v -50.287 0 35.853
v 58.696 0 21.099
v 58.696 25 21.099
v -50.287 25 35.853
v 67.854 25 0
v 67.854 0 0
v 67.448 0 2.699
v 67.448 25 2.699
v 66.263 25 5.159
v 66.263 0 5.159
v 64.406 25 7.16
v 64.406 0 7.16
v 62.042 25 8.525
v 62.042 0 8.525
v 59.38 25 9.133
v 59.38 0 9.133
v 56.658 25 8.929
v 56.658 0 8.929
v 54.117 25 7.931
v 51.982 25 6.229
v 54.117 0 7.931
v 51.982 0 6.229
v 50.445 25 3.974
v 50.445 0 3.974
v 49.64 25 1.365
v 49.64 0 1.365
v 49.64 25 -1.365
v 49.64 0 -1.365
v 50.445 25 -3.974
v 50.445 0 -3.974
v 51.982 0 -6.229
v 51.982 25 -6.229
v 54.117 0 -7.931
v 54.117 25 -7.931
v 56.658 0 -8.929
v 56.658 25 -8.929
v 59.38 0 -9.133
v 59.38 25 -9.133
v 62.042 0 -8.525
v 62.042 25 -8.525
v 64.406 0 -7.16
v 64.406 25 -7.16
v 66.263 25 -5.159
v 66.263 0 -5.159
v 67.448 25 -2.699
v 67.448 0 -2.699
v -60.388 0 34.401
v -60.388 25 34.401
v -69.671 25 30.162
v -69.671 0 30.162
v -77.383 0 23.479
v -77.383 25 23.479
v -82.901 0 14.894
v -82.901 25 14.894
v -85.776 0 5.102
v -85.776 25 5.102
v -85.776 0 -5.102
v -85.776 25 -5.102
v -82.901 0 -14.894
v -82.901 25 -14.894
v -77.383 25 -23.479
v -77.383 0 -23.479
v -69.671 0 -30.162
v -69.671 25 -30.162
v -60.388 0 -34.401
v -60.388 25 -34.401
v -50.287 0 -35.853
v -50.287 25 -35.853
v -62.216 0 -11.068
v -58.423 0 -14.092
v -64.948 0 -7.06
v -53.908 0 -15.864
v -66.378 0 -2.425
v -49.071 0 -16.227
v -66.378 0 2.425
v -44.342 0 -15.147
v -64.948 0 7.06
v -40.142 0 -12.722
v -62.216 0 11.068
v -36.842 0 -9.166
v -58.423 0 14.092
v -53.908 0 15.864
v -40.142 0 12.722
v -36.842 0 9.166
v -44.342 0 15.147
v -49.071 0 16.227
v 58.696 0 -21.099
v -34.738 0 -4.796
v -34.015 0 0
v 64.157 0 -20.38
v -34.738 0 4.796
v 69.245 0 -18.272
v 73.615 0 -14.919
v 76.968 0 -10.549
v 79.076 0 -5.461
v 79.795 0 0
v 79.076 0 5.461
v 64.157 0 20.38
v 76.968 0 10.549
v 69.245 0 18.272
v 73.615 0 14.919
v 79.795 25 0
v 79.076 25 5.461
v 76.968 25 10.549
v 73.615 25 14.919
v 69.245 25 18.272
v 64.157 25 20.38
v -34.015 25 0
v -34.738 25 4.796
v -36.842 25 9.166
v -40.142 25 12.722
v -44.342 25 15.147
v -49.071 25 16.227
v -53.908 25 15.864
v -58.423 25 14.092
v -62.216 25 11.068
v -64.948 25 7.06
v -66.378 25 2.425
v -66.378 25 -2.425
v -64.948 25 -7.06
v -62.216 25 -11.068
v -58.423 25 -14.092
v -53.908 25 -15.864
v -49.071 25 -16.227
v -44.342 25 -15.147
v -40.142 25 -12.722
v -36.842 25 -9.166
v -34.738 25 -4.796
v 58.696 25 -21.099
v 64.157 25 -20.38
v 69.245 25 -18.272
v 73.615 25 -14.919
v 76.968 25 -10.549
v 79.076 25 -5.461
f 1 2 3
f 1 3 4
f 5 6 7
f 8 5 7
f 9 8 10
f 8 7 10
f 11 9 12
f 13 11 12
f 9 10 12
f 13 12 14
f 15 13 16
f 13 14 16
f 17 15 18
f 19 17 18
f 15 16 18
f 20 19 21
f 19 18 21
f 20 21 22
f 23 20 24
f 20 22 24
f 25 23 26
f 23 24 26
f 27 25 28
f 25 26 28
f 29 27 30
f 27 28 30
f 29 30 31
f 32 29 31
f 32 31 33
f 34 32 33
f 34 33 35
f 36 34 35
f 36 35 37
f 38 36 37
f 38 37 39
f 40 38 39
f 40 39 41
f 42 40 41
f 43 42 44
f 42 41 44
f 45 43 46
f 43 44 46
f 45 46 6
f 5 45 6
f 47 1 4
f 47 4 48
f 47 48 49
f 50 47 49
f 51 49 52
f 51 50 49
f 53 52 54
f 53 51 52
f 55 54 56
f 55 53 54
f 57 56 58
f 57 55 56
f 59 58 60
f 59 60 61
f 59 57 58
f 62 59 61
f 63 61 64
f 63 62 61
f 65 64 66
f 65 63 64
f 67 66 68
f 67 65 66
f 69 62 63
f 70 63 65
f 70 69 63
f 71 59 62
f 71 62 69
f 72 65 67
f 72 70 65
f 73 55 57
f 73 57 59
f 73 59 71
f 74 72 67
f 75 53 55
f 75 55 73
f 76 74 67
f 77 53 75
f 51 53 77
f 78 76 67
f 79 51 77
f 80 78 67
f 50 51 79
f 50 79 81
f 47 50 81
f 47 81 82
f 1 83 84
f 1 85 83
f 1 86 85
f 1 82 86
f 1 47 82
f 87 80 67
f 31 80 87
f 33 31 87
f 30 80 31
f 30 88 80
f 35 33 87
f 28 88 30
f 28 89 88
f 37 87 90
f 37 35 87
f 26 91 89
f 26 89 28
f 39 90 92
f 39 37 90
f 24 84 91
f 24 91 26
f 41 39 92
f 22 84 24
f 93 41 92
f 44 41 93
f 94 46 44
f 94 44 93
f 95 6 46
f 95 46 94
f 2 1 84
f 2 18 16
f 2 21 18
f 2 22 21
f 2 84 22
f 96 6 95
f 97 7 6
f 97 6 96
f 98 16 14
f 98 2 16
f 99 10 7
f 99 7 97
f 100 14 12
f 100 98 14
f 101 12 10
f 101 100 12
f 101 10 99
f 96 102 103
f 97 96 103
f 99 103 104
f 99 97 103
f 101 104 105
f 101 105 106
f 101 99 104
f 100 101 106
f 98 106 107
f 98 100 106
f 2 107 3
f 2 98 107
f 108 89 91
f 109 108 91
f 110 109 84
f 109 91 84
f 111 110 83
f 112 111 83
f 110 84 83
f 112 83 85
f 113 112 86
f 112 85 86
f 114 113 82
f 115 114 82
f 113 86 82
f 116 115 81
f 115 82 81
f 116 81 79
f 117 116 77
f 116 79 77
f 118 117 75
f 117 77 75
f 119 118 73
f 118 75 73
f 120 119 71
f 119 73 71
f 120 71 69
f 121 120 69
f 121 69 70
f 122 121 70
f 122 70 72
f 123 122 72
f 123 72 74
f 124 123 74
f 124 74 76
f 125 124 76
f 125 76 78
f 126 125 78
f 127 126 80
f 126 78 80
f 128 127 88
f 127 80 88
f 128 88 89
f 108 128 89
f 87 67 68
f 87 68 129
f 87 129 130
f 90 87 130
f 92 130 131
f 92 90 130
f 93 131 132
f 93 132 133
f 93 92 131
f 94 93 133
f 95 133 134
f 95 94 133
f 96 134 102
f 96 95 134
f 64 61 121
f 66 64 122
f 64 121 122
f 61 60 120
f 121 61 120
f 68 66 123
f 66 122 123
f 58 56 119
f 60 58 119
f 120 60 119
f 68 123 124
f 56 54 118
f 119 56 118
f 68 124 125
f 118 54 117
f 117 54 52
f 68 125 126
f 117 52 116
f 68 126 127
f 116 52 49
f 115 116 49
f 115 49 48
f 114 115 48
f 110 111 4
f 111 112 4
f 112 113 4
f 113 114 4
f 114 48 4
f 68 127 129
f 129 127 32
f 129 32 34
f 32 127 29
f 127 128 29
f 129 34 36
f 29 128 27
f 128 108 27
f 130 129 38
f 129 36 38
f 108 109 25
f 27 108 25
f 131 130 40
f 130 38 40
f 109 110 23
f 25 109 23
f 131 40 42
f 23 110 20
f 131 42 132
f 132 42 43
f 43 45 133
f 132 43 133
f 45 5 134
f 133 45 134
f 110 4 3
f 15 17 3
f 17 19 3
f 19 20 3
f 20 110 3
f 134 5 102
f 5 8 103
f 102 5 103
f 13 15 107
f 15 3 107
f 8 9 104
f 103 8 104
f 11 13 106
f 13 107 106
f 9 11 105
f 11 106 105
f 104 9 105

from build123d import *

# Parameters (mm, degrees)
F0_R     = 16.2722693288
F0_R_2   = 9.1584338909
F1_DEPTH = 25


# Not quite as in the source:
# - the program builds the solid bodies; features that only make, move or delete a surface that nothing else refers to are left out


with BuildPart() as f1:
    # F0 (on Front) → F1 (new body)
    with BuildSketch(Plane.XZ):
        with BuildLine():
            Line((-40.7540334754, 34.5627303773), (-50.2872206271, 35.8533678809))
            ThreePointArc((-50.2872206271, 35.8533678809), (-86.140588508, 0), (-50.2872206271, -35.8533678809))
            Line((-50.2872206271, -35.8533678809), (-40.7540334754, -34.5627303773))
            ThreePointArc((-40.7540334754, -34.5627303773), (-21.7630128867, -21.721730161), (-14.4338527462, 0))
            ThreePointArc((-14.4338527462, 0), (-21.7630128867, 21.721730161), (-40.7540334754, 34.5627303773))
        make_face()
        with Locations((-50.2872206271, 0)):
            Circle(F0_R, mode=Mode.SUBTRACT)
        with BuildLine():
            Line((58.6960054934, 21.0988228735), (-40.7540334754, 34.5627303773))
            ThreePointArc((-40.7540334754, 34.5627303773), (-21.7630128867, 21.721730161), (-14.4338527462, 0))
            ThreePointArc((-14.4338527462, 0), (-21.7630128867, -21.721730161), (-40.7540334754, -34.5627303773))
            Line((-40.7540334754, -34.5627303773), (58.6960054934, -21.0988228735))
            ThreePointArc((58.6960054934, -21.0988228735), (37.59718262, 0), (58.6960054934, 21.0988228735))
        make_face()
        with BuildLine():
            ThreePointArc((79.7948283669, 0), (73.6151262223, 14.9191207289), (58.6960054934, 21.0988228735))
            ThreePointArc((58.6960054934, 21.0988228735), (37.59718262, 0), (58.6960054934, -21.0988228735))
            ThreePointArc((58.6960054934, -21.0988228735), (73.6151262223, -14.9191207289), (79.7948283669, 0))
        make_face()
        with Locations((58.6960054934, 0)):
            Circle(F0_R_2, mode=Mode.SUBTRACT)
    extrude(amount=-F1_DEPTH)


solid = f1.part
